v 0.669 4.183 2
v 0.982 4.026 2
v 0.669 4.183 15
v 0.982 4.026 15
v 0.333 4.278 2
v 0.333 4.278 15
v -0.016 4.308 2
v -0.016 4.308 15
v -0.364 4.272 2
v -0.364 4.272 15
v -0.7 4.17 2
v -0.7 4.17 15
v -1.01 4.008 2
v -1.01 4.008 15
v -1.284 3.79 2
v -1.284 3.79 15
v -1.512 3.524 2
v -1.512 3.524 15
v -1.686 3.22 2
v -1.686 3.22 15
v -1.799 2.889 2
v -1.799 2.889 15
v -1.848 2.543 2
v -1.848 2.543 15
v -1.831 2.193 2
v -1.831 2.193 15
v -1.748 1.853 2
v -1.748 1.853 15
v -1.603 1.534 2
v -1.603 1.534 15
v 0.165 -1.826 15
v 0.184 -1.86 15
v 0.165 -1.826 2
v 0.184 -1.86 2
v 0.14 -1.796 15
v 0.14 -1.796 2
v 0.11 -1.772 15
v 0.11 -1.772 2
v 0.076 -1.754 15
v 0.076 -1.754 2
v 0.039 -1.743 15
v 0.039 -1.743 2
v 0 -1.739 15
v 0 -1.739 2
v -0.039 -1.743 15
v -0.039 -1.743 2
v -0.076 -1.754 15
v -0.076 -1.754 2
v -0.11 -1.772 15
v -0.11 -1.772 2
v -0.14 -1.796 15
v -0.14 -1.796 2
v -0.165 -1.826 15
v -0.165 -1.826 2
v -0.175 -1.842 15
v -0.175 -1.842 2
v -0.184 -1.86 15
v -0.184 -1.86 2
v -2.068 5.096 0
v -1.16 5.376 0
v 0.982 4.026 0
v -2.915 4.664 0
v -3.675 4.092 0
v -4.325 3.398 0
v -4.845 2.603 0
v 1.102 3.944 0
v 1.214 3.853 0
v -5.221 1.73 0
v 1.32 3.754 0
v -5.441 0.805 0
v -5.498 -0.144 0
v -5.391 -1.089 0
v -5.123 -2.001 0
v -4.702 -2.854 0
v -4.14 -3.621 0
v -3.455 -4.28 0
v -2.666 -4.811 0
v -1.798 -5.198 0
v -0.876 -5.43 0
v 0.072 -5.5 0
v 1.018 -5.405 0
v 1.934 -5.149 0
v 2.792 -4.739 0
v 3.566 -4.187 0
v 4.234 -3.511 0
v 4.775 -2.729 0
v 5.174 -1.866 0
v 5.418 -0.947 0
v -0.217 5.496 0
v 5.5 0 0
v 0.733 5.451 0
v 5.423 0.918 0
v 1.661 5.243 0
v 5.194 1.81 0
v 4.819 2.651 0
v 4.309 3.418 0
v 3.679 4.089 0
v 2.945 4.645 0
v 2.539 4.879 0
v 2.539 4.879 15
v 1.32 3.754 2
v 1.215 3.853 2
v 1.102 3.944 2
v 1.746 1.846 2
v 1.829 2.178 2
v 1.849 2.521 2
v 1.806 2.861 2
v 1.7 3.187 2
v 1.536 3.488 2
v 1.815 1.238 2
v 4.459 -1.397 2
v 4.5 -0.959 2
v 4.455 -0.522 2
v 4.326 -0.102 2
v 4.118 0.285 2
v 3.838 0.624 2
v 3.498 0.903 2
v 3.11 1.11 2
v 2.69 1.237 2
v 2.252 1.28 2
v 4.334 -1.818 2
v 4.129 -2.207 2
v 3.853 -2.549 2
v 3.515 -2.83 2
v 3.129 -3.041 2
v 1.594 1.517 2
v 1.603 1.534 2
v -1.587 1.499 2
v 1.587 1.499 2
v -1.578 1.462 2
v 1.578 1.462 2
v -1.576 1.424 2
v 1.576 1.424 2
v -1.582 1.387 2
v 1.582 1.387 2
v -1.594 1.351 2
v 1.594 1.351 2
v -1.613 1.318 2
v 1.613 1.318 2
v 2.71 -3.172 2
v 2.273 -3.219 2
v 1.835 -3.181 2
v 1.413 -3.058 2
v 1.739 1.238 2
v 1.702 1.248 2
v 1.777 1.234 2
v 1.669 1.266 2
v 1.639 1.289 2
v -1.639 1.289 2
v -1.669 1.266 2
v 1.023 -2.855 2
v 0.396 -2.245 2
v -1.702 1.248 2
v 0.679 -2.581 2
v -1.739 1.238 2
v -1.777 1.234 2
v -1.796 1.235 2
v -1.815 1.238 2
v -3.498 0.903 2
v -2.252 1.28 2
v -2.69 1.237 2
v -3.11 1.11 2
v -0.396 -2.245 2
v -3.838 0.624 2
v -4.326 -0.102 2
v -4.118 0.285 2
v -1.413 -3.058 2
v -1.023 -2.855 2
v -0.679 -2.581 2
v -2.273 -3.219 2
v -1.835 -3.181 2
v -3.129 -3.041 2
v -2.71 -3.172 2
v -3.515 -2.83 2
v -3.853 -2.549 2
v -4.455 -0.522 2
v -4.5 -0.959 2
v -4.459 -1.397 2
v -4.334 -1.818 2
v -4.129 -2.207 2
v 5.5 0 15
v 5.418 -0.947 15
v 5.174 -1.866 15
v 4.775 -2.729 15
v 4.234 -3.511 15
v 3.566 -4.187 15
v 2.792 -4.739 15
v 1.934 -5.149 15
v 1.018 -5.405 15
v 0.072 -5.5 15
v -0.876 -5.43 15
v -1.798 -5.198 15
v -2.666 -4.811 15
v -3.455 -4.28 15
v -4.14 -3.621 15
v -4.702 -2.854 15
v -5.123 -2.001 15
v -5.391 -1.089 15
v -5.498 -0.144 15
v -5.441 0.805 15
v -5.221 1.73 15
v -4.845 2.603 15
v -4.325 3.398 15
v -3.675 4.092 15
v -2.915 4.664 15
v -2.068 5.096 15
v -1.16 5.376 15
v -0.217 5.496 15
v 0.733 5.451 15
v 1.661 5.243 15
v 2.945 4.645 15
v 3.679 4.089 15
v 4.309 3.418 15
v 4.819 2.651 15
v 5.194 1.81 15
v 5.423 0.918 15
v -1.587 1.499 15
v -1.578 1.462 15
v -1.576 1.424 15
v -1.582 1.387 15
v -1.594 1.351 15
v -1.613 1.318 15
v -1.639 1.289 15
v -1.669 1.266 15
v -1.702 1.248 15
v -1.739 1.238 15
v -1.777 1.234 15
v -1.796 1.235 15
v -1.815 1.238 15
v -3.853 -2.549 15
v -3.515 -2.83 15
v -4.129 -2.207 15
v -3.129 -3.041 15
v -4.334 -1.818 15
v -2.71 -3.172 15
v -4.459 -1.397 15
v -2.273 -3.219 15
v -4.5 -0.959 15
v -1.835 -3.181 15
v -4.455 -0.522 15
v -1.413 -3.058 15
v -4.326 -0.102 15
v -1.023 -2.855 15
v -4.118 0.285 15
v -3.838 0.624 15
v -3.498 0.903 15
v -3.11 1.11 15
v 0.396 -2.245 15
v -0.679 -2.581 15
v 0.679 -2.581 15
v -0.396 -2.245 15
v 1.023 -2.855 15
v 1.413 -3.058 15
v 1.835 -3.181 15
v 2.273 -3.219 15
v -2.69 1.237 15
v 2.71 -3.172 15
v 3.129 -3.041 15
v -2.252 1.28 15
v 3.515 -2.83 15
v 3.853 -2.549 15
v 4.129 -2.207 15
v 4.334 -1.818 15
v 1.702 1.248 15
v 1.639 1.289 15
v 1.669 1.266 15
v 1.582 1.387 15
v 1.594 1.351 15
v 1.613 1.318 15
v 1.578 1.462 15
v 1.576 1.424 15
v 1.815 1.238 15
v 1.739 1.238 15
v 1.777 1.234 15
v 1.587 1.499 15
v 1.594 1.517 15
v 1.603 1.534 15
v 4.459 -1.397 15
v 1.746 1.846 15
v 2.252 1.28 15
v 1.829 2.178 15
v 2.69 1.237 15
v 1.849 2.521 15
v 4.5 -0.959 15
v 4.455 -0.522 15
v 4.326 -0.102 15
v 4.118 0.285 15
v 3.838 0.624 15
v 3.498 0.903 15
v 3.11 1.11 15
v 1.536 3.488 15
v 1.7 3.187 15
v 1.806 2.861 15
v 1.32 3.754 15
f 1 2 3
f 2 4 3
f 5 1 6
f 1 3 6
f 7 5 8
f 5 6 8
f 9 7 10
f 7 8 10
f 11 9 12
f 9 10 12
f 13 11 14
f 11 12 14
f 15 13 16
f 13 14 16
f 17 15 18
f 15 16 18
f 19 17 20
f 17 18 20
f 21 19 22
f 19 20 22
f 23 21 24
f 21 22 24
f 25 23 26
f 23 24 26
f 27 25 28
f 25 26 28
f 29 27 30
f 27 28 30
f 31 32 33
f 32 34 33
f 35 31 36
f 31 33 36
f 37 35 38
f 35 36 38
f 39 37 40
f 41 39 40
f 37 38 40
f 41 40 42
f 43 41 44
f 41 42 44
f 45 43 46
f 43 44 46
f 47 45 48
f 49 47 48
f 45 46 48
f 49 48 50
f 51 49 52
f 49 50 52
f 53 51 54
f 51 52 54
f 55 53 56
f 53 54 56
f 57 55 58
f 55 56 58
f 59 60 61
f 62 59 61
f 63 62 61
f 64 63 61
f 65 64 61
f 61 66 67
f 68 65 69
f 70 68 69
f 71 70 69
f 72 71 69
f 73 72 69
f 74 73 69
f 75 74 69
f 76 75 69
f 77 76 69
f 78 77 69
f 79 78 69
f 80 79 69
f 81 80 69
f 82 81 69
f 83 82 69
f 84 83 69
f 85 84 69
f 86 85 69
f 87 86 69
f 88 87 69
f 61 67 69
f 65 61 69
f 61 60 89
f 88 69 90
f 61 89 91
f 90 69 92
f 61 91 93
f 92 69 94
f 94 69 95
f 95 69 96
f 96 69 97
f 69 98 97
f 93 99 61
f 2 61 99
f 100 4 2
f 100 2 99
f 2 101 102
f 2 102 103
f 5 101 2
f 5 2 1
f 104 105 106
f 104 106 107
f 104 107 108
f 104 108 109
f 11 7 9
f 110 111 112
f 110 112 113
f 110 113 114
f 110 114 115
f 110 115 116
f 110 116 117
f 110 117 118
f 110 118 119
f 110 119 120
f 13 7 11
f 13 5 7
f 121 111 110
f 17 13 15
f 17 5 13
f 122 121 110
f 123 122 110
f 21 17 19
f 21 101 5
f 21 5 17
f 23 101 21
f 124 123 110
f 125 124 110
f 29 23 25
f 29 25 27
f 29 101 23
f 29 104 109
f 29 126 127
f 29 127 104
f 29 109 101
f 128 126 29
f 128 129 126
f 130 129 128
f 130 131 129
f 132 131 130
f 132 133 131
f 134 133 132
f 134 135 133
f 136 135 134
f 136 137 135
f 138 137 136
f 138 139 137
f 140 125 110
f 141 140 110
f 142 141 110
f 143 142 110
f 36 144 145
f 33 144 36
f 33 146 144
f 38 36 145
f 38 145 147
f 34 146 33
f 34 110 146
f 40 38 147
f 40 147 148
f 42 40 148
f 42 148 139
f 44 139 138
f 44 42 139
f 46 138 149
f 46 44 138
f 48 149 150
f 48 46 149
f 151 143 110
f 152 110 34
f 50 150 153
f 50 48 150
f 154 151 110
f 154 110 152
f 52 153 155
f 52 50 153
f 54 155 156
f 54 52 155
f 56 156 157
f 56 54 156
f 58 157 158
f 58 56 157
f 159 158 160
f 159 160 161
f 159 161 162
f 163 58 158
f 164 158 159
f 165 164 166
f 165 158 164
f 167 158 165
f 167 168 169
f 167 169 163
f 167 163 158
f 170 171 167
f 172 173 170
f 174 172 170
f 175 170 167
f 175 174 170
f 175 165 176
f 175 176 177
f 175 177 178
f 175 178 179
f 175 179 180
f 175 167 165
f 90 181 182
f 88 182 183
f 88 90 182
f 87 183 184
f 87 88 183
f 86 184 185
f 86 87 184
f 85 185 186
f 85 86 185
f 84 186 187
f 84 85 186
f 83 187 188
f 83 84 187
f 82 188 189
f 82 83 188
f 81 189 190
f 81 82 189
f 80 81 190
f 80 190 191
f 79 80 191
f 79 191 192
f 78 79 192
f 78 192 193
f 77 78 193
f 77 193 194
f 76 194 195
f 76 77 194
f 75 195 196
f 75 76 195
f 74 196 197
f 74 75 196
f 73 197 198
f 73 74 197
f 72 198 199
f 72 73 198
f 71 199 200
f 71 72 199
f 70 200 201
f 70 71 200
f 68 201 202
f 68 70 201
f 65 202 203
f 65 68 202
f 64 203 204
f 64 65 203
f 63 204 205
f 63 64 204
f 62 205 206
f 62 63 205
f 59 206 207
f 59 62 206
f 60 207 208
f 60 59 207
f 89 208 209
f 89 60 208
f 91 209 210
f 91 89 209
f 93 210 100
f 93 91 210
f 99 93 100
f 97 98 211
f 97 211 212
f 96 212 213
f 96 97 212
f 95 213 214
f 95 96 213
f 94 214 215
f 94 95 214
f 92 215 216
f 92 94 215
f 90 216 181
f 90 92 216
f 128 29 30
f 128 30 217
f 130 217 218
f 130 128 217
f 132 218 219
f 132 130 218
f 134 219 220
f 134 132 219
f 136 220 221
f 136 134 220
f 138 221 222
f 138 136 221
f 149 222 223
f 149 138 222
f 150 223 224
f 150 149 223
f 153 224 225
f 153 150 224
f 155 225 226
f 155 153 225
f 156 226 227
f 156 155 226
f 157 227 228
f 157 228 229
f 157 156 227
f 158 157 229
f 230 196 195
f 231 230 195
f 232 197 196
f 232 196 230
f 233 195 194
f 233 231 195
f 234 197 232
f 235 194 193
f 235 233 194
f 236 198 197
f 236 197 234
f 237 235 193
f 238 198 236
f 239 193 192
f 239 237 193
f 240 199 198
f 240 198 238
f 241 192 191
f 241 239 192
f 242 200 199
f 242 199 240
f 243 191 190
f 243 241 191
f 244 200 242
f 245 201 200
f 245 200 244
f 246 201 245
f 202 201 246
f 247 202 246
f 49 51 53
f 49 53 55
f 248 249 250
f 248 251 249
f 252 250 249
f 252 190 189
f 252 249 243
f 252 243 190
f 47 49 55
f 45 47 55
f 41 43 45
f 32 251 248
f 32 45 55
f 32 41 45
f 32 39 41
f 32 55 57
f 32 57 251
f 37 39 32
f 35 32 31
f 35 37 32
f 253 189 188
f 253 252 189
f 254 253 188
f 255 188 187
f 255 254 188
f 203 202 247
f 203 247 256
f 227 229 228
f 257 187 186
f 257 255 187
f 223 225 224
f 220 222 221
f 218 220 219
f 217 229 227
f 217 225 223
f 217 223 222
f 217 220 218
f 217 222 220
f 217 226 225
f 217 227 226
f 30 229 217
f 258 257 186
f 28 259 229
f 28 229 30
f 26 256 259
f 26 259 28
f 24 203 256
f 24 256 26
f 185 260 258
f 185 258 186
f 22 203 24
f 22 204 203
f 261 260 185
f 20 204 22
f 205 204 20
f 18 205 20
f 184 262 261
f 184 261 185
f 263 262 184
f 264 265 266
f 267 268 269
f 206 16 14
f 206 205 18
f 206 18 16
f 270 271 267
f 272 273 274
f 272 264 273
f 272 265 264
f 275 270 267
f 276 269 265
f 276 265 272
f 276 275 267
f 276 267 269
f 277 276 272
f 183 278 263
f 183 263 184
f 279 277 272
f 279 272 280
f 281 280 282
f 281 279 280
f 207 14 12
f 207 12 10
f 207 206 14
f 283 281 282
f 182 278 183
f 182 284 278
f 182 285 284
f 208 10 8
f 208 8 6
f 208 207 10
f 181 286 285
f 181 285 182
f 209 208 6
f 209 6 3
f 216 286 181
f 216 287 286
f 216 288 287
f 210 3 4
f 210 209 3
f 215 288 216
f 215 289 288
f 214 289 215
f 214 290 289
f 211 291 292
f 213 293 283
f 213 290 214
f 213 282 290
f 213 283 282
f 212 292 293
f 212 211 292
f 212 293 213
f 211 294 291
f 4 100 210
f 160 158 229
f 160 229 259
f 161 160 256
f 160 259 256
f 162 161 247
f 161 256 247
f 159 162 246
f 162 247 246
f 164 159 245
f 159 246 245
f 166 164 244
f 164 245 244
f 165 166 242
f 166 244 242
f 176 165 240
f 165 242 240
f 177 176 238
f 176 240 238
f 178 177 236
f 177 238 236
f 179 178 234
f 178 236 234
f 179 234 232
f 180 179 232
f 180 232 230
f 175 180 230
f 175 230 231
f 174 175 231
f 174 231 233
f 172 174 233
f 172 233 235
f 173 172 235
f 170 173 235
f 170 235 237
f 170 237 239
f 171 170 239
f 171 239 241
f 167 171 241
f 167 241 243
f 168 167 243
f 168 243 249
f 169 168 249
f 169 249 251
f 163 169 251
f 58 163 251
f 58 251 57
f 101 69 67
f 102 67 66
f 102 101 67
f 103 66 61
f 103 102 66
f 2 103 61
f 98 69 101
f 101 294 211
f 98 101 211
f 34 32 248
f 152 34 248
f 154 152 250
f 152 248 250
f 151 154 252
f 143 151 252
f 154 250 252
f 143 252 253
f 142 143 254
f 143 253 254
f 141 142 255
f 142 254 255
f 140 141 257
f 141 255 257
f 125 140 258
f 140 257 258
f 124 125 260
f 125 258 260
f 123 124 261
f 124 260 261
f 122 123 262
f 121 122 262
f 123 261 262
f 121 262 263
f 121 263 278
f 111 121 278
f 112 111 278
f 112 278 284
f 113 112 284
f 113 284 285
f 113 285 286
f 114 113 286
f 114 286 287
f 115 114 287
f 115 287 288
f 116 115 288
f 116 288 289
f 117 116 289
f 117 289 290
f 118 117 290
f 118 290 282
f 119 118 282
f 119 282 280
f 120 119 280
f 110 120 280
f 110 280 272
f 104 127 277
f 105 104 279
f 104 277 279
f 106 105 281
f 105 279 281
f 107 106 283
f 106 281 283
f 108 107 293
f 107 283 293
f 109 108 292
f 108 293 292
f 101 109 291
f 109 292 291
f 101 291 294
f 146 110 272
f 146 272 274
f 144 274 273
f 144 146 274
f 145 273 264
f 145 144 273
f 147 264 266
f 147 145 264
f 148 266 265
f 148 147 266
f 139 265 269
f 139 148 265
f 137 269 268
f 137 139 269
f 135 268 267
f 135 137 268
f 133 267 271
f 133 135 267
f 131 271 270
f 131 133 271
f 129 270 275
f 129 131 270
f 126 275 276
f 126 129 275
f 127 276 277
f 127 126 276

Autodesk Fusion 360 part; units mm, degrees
sketch "Sketch2" plane through (0, 0, 0) normal (0, 0, 1) x (1, 0, 0) in component "2x12AWG_silicone, 1x DS18B"
  circle A0 centre (0, 0) radius 5.5
  dimension "d8" = 11
extrude "Extrude1" add sketch "Sketch2" along normal blind 15 in component "2x12AWG_silicone, 1x DS18B"
sketch "Sketch3" plane through (0, 0, 15) normal (0, 0, 1) x (-1, 0, 0) in component "2x12AWG_silicone, 1x DS18B"
  circle A0 centre (0, 0) radius 5.5
  circle A1 centre (2.25, 0.9695) radius 2.25
  circle A2 centre (-2.25, 0.9695) radius 2.25
  circle A3 centre (0, -2.4579) radius 1.85
  circle A4 centre (0, 0) radius 4.7 construction
  dimension "d11" = 4.5
  dimension "d12" = 3.7
  dimension "d13" = 0.8
extrude "Extrude2" cut sketch "Sketch3" against normal blind 13 contours A1 | A2 | A1 A2 A3 | A3 in component "2x12AWG_silicone, 1x DS18B"
fillet "Fillet1" radius 0.2 3 edges at (-1.0152, 0.9114, 8.5) (0, -0.9695, 8.5) (1.0152, 0.9114, 8.5) in component "2x12AWG_silicone, 1x DS18B"
sketch "Sketch4" plane through (0, 0, 15) normal (0, 0, 1) x (-1, 0, 0) in component "2x12AWG_silicone, 1x DS18B"
  arc A0 (-1.6028, -1.5341) -> (-1.8148, -1.238) centre (-1.7761, -1.4342) ccw
  arc A1 (-0.1837, 1.8599) -> (-1.8148, -1.238) centre (-2.25, 0.9695) ccw
  arc A2 (-0.1837, 1.8599) -> (0.1837, 1.8599) centre (0, 1.9391) ccw
  arc A3 (1.8148, -1.238) -> (0.1837, 1.8599) centre (2.25, 0.9695) ccw
  arc A4 (1.8148, -1.238) -> (1.6028, -1.5341) centre (1.7761, -1.4342) ccw
  arc A5 (-1.6028, -1.5341) -> (1.6028, -1.5341) centre (0, -2.4579) ccw
  circle A6 centre (0, 0) radius 5.5
  line L0 (-0.9824, -4.0255) -> (-2.539, -4.8789)
  line L1 (-1.3198, -3.7543) -> (-2.9449, -4.6452)
  dimension "d18" = 0.4
extrude "Extrude3" cut sketch "Sketch4" against normal blind 16.5 contours A5 A6 L0 L1 in component "2x12AWG_silicone, 1x DS18B"
component "2x12AWG_silicone, 1x DS18B" placed x (1, 0, 0) y (0, 1, 0) z (0, 0, 1) at (0, 0, 0)
equation "Si12AWG = 4.6 mm"
equation "DS18B20 = 3.7 mm"
equation "clearance = 0.2 mm"
equation "gland_ID_max = 12 mm"
equation "gland_ID_min = 5.65 mm"
equation "insert_D = 9 mm"
equation "insert_L = 15 mm"
equation "d8 = gland_ID_max - 1 mm"
equation "d9 = insert_L"
equation "d11 = Si12AWG - clearance / 2"
equation "d12 = DS18B20"
